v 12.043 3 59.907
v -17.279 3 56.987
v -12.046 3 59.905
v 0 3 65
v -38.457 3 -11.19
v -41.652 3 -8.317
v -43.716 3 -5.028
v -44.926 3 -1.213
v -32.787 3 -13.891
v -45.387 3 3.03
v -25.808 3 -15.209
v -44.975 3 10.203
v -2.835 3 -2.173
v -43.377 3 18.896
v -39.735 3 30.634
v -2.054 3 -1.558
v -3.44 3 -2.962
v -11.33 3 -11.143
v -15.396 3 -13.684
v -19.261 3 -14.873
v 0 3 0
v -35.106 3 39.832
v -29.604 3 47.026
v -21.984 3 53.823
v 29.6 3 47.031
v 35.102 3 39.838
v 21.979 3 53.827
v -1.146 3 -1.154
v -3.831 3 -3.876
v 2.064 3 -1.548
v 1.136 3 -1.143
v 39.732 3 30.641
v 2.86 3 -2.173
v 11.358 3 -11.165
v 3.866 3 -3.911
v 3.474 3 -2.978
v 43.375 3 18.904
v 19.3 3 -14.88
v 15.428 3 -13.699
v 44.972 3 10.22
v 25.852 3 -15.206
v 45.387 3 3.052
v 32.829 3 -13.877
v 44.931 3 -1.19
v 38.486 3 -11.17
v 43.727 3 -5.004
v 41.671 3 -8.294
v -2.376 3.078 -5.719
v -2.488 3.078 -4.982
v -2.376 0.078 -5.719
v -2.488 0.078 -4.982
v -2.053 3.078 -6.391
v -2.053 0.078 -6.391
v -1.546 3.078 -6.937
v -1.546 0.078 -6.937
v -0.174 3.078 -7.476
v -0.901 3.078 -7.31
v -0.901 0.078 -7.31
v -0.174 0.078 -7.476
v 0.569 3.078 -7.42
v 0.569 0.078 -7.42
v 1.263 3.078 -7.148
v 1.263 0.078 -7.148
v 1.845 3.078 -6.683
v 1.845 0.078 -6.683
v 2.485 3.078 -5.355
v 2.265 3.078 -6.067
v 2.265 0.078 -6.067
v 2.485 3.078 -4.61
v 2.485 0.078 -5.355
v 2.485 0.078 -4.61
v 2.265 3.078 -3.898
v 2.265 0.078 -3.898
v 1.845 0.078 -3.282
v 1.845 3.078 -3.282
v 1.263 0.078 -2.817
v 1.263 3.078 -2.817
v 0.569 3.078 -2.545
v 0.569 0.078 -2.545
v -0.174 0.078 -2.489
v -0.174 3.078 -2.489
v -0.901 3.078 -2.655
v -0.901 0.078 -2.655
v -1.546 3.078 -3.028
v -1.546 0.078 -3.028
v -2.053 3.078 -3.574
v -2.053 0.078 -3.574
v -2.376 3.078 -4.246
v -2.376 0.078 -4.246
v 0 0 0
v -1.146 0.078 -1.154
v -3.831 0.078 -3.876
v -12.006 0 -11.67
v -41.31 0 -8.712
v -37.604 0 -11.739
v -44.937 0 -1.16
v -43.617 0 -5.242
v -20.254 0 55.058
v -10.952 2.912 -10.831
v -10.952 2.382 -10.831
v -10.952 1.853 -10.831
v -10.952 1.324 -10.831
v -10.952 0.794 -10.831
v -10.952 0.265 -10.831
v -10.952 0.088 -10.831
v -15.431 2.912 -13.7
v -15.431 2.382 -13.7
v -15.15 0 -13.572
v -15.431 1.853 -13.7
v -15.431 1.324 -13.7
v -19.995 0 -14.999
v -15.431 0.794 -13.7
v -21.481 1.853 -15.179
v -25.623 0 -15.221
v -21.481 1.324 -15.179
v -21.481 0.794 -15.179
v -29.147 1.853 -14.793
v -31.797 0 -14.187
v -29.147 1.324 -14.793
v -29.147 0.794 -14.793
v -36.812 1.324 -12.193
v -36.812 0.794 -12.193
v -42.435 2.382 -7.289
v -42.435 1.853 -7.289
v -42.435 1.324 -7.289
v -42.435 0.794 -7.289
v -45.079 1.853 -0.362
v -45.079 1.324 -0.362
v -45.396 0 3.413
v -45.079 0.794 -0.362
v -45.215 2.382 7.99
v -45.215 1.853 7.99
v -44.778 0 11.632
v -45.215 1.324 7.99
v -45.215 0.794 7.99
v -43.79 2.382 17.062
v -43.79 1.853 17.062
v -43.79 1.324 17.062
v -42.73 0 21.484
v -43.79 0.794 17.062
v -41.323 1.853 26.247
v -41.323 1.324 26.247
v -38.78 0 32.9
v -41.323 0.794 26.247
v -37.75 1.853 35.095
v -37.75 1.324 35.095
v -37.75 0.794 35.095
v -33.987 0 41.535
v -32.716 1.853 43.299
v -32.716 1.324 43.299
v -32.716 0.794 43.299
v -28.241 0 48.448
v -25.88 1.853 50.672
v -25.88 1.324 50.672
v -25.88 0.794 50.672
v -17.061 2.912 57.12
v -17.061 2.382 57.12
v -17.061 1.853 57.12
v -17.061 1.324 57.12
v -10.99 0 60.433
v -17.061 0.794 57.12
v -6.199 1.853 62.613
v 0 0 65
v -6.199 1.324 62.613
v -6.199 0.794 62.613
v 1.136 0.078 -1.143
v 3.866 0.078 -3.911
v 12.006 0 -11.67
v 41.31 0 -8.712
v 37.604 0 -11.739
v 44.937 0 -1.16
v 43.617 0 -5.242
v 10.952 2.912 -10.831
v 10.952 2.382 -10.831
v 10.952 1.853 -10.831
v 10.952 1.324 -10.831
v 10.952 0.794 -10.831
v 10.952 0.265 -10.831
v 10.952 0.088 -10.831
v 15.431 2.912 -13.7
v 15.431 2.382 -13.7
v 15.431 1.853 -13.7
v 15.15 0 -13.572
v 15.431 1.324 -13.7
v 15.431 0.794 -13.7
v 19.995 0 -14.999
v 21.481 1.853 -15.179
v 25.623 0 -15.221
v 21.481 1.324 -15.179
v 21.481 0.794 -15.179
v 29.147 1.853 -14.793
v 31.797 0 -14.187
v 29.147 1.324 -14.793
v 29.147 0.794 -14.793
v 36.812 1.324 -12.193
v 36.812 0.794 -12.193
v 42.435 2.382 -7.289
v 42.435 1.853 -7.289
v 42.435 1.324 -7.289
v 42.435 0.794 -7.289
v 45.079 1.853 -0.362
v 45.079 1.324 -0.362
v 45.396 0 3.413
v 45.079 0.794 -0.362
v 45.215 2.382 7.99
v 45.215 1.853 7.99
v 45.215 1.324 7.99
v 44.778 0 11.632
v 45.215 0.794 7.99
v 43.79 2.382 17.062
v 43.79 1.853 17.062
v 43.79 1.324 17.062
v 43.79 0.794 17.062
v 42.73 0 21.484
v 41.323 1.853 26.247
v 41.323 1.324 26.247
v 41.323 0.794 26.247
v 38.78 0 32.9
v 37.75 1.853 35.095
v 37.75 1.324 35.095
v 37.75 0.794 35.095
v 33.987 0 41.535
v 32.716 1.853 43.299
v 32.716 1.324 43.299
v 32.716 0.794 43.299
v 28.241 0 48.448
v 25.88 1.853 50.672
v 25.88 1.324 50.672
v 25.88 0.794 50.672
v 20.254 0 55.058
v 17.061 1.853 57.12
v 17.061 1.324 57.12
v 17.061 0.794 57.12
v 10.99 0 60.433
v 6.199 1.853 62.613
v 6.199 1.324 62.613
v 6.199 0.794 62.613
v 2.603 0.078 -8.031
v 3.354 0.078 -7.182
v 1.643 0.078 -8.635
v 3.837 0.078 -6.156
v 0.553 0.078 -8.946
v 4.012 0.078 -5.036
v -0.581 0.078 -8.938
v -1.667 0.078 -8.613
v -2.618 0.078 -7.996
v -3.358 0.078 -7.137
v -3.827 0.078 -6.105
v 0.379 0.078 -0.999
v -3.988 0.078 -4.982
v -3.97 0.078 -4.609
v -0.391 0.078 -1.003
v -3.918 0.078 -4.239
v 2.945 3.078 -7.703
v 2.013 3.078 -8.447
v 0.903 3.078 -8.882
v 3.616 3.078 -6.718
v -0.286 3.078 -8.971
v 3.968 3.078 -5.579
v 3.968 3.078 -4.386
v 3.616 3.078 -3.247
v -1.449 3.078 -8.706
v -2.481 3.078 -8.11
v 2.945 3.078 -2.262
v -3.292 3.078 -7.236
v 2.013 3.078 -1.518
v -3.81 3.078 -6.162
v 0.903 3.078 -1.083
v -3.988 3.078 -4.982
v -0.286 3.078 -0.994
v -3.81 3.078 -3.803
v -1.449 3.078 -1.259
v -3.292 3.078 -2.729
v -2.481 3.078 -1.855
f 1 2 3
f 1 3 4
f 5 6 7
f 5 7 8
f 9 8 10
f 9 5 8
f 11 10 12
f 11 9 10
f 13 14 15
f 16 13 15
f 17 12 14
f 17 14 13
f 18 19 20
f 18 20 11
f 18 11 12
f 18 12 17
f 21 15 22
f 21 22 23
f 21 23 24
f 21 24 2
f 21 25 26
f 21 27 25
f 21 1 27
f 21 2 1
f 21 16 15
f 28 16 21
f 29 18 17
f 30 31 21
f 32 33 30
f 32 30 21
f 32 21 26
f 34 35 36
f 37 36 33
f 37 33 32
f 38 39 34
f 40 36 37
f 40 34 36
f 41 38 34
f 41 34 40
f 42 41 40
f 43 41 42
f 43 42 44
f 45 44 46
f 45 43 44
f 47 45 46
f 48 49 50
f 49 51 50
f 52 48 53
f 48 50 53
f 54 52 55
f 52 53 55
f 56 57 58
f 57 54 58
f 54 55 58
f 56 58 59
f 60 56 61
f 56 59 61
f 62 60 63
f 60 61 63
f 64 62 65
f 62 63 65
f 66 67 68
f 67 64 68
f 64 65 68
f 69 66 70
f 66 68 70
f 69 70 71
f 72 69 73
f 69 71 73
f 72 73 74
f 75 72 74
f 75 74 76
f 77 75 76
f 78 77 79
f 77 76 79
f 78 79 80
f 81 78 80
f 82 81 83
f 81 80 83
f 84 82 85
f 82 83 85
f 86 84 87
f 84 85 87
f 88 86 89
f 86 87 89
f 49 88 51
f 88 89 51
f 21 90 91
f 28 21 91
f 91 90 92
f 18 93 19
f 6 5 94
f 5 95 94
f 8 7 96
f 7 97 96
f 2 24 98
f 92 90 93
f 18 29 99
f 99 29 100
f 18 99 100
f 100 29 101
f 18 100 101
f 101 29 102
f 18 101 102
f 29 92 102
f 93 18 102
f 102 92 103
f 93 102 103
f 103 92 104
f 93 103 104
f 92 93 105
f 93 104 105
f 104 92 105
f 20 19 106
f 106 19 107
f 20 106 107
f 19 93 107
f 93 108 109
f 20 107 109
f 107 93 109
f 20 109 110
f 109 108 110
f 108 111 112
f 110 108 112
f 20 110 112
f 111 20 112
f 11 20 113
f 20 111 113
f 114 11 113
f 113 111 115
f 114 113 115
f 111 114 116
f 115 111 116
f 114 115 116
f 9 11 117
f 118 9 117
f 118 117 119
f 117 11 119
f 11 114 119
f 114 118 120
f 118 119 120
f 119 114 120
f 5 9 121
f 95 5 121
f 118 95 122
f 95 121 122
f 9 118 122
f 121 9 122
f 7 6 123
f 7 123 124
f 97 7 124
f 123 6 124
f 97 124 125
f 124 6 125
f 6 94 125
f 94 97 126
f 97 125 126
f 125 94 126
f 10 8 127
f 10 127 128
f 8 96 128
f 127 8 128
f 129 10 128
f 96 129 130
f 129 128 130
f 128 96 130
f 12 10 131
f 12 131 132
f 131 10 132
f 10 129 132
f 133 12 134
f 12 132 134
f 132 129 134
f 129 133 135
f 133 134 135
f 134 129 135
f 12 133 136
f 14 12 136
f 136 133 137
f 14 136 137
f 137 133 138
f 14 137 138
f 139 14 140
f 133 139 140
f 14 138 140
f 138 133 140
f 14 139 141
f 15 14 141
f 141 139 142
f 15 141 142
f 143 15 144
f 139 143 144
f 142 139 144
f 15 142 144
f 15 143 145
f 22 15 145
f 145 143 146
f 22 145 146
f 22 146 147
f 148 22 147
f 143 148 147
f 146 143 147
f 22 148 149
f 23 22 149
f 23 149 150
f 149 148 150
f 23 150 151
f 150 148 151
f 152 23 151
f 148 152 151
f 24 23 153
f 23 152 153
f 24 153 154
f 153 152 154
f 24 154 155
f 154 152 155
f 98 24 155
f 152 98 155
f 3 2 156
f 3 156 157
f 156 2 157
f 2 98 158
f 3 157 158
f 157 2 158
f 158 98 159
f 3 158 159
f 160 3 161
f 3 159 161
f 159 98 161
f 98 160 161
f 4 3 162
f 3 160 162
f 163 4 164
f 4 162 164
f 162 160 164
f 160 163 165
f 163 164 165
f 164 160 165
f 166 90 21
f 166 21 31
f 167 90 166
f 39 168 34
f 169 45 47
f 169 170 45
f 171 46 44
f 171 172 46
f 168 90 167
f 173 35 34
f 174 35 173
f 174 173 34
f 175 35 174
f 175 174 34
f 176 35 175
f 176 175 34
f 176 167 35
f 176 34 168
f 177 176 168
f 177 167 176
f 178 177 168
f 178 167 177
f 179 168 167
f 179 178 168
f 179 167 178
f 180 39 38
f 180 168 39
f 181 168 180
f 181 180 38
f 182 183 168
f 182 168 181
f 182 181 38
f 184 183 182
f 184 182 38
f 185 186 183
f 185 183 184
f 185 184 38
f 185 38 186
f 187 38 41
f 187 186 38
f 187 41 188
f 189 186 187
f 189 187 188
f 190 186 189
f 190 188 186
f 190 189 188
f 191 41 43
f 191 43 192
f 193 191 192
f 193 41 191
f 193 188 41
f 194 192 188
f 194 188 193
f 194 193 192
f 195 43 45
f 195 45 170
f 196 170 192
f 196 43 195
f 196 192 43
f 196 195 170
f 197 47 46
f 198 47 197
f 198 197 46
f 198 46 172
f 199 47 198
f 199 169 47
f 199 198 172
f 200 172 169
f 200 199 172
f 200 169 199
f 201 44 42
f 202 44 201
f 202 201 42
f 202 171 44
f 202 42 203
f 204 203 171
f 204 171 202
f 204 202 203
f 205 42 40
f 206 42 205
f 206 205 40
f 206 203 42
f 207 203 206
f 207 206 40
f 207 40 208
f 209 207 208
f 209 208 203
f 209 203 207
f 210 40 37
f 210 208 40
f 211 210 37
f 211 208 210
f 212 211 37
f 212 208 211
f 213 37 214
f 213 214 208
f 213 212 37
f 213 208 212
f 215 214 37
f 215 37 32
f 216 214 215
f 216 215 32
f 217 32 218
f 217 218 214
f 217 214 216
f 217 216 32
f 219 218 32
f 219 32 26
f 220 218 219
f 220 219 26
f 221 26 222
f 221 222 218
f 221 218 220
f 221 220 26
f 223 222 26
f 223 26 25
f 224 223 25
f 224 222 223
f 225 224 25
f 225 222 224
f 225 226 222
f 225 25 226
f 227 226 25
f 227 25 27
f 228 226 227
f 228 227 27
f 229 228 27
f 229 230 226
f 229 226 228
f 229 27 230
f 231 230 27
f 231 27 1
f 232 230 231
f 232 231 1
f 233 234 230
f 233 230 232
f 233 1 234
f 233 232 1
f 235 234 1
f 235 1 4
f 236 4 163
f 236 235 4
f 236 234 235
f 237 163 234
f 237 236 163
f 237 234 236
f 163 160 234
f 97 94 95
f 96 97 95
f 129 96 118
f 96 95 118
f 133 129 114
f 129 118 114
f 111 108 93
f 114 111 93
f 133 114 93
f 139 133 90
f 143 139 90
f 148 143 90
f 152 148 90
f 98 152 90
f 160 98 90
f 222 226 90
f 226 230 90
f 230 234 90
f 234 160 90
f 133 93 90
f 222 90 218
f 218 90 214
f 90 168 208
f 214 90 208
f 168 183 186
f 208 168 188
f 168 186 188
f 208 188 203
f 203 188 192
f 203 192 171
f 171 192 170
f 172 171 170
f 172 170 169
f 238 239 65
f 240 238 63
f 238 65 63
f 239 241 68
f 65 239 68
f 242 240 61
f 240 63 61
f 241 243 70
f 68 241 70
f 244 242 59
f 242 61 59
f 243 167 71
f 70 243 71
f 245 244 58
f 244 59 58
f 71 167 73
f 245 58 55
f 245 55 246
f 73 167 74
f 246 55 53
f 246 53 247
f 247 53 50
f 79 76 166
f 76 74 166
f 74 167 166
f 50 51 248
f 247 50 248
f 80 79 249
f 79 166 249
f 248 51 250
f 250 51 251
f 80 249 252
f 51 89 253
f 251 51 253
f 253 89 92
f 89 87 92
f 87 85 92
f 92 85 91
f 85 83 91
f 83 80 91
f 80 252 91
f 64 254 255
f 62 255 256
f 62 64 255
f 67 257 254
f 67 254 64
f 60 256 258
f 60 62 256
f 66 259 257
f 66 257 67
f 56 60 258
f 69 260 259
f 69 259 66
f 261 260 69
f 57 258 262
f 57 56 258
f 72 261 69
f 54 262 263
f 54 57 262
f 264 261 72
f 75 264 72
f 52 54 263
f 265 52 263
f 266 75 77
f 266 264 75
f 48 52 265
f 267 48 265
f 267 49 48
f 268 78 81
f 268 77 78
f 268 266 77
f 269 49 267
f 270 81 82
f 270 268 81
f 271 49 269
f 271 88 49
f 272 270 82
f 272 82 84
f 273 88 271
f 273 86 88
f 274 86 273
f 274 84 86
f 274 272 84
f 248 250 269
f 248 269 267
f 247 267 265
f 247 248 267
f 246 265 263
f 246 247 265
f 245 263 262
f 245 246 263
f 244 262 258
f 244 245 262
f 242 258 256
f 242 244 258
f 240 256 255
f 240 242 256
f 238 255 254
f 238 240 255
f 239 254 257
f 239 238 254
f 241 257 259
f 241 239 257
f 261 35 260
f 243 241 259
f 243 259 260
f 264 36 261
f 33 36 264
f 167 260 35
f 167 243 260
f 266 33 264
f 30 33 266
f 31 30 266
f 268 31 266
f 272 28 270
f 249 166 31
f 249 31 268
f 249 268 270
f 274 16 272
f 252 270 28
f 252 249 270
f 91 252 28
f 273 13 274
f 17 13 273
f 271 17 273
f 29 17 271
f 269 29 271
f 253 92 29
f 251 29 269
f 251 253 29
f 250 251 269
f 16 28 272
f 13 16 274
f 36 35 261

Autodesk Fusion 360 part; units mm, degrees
sketch "草图1" plane through (0, 0, 0) normal (0, 1, 0) x (1, 0, 0)
  spline S0 degree 5 poles (0, 0) (-0.5793, 0.5821) (-1.7157, 1.7269) (-3.3538, 3.3854) (-5.4045, 5.4793) (-7.7689, 7.8927) (-10.0073, 10.0799) (-12.2674, 11.9974) (-14.7989, 13.5743) (-17.8484, 14.7231) (-21.5675, 15.3505) (-25.8885, 15.3683) (-30.5109, 14.703) (-35.0251, 13.3026) (-39.0061, 11.1441) (-42.1086, 8.2405) (-44.187, 4.6516) (-45.2856, 0.4771) (-45.5576, -4.1594) (-45.2061, -9.1233) (-44.4201, -14.2831) (-43.3041, -19.5247) (-41.886, -24.7523) (-40.1407, -29.8862) (-38.0071, -34.8616) (-35.4076, -39.6274) (-32.2667, -44.1449) (-28.5308, -48.3872) (-24.1657, -52.3367) (-19.1518, -55.9834) (-13.4806, -59.3227) (-8.4167, -61.7474) (-4.3231, -63.4274) (-1.4629, -64.486) (0, -65) knots 0 0 0 0 0 0 0.033333 0.066667 0.1 0.133333 0.166667 0.2 0.233333 0.266667 0.3 0.333333 0.366667 0.4 0.433333 0.466667 0.5 0.533333 0.566667 0.6 0.633333 0.666667 0.7 0.733333 0.766667 0.8 0.833333 0.866667 0.9 0.933333 0.966667 1 1 1 1 1 1
  spline S1 degree 5 poles (0, 0) (0.5793, 0.5821) (1.7157, 1.7269) (3.3538, 3.3854) (5.4045, 5.4793) (7.7689, 7.8927) (10.0073, 10.0799) (12.2674, 11.9974) (14.7989, 13.5743) (17.8484, 14.7231) (21.5675, 15.3505) (25.8885, 15.3683) (30.5109, 14.703) (35.0251, 13.3026) (39.0061, 11.1441) (42.1086, 8.2405) (44.187, 4.6516) (45.2856, 0.4771) (45.5576, -4.1594) (45.2061, -9.1233) (44.4201, -14.2831) (43.3041, -19.5247) (41.886, -24.7523) (40.1407, -29.8862) (38.0071, -34.8616) (35.4076, -39.6274) (32.2667, -44.1449) (28.5308, -48.3872) (24.1657, -52.3367) (19.1518, -55.9834) (13.4806, -59.3227) (8.4167, -61.7474) (4.3231, -63.4274) (1.4629, -64.486) (0, -65) knots 0 0 0 0 0 0 0.033333 0.066667 0.1 0.133333 0.166667 0.2 0.233333 0.266667 0.3 0.333333 0.366667 0.4 0.433333 0.466667 0.5 0.533333 0.566667 0.6 0.633333 0.666667 0.7 0.733333 0.766667 0.8 0.833333 0.866667 0.9 0.933333 0.966667 1 1 1 1 1 1
  point P0 (-10, 10)
  point P1 (-20, 15)
  point P2 (-40, 10)
  point P3 (-45, -10)
  point P4 (-35, -40)
  point P5 (10, 10)
  point P6 (20, 15)
  point P7 (40, 10)
  point P8 (45, -10)
  point P9 (35, -40)
extrude "拉伸1" add sketch "草图1" along normal blind 3 makes body 1
sketch "草图2" plane through (0, 3, 0) normal (0, 1, 0) x (-1, 0, 0)
  spline S0 degree 5 poles (0, 0) (0.5793, -0.5821) (1.7157, -1.7269) (3.3538, -3.3854) (5.4045, -5.4793) (7.7689, -7.8927) (10.0073, -10.0799) (12.2674, -11.9974) (14.7989, -13.5743) (17.8484, -14.7231) (21.5675, -15.3505) (25.8885, -15.3683) (30.5109, -14.703) (35.0251, -13.3026) (39.0061, -11.1441) (42.1086, -8.2405) (44.187, -4.6516) (45.2856, -0.4771) (45.5576, 4.1594) (45.2061, 9.1233) (44.4201, 14.2831) (43.3041, 19.5247) (41.886, 24.7523) (40.1407, 29.8862) (38.0071, 34.8616) (35.4076, 39.6274) (32.2667, 44.1449) (28.5308, 48.3872) (24.1657, 52.3367) (19.1518, 55.9834) (13.4806, 59.3227) (8.4167, 61.7474) (4.3231, 63.4274) (1.4629, 64.486) (0, 65) knots 0 0 0 0 0 0 0.033333 0.066667 0.1 0.133333 0.166667 0.2 0.233333 0.266667 0.3 0.333333 0.366667 0.4 0.433333 0.466667 0.5 0.533333 0.566667 0.6 0.633333 0.666667 0.7 0.733333 0.766667 0.8 0.833333 0.866667 0.9 0.933333 0.966667 1 1 1 1 1 1
  spline S1 degree 5 poles (0, 65) (-1.4629, 64.486) (-4.3231, 63.4274) (-8.4167, 61.7474) (-13.4806, 59.3227) (-19.1518, 55.9834) (-24.1657, 52.3367) (-28.5308, 48.3872) (-32.2667, 44.1449) (-35.4076, 39.6274) (-38.0071, 34.8616) (-40.1407, 29.8862) (-41.886, 24.7523) (-43.3041, 19.5247) (-44.4201, 14.2831) (-45.2061, 9.1233) (-45.5576, 4.1594) (-45.2856, -0.4771) (-44.187, -4.6516) (-42.1086, -8.2405) (-39.0061, -11.1441) (-35.0251, -13.3026) (-30.5109, -14.703) (-25.8885, -15.3683) (-21.5675, -15.3505) (-17.8484, -14.7231) (-14.7989, -13.5743) (-12.2674, -11.9974) (-10.0073, -10.0799) (-7.7689, -7.8927) (-5.4045, -5.4793) (-3.3538, -3.3854) (-1.7157, -1.7269) (-0.5793, -0.5821) (0, 0) knots -1 -1 -1 -1 -1 -1 -0.966667 -0.933333 -0.9 -0.866667 -0.833333 -0.8 -0.766667 -0.733333 -0.7 -0.666667 -0.633333 -0.6 -0.566667 -0.533333 -0.5 -0.466667 -0.433333 -0.4 -0.366667 -0.333333 -0.3 -0.266667 -0.233333 -0.2 -0.166667 -0.133333 -0.1 -0.066667 -0.033333 0 0 0 0 0 0
  circle A0 centre (-75, 0) radius 2.5
  circle A1 centre (-75, 0) radius 4
  dimension "d3" = 5
  dimension "d4" = 8
extrude "拉伸2" add sketch "草图2" along normal blind 3 separate body contours A1 makes body 2
move_body "移动1" bodies 2 to x (1, 0, 0) y (0, 1, 0) z (0, 0, 1) at (-74.9875, -2.9216, -4.9825)
combine "合并1" operation add target body 1 tool bodies 2
